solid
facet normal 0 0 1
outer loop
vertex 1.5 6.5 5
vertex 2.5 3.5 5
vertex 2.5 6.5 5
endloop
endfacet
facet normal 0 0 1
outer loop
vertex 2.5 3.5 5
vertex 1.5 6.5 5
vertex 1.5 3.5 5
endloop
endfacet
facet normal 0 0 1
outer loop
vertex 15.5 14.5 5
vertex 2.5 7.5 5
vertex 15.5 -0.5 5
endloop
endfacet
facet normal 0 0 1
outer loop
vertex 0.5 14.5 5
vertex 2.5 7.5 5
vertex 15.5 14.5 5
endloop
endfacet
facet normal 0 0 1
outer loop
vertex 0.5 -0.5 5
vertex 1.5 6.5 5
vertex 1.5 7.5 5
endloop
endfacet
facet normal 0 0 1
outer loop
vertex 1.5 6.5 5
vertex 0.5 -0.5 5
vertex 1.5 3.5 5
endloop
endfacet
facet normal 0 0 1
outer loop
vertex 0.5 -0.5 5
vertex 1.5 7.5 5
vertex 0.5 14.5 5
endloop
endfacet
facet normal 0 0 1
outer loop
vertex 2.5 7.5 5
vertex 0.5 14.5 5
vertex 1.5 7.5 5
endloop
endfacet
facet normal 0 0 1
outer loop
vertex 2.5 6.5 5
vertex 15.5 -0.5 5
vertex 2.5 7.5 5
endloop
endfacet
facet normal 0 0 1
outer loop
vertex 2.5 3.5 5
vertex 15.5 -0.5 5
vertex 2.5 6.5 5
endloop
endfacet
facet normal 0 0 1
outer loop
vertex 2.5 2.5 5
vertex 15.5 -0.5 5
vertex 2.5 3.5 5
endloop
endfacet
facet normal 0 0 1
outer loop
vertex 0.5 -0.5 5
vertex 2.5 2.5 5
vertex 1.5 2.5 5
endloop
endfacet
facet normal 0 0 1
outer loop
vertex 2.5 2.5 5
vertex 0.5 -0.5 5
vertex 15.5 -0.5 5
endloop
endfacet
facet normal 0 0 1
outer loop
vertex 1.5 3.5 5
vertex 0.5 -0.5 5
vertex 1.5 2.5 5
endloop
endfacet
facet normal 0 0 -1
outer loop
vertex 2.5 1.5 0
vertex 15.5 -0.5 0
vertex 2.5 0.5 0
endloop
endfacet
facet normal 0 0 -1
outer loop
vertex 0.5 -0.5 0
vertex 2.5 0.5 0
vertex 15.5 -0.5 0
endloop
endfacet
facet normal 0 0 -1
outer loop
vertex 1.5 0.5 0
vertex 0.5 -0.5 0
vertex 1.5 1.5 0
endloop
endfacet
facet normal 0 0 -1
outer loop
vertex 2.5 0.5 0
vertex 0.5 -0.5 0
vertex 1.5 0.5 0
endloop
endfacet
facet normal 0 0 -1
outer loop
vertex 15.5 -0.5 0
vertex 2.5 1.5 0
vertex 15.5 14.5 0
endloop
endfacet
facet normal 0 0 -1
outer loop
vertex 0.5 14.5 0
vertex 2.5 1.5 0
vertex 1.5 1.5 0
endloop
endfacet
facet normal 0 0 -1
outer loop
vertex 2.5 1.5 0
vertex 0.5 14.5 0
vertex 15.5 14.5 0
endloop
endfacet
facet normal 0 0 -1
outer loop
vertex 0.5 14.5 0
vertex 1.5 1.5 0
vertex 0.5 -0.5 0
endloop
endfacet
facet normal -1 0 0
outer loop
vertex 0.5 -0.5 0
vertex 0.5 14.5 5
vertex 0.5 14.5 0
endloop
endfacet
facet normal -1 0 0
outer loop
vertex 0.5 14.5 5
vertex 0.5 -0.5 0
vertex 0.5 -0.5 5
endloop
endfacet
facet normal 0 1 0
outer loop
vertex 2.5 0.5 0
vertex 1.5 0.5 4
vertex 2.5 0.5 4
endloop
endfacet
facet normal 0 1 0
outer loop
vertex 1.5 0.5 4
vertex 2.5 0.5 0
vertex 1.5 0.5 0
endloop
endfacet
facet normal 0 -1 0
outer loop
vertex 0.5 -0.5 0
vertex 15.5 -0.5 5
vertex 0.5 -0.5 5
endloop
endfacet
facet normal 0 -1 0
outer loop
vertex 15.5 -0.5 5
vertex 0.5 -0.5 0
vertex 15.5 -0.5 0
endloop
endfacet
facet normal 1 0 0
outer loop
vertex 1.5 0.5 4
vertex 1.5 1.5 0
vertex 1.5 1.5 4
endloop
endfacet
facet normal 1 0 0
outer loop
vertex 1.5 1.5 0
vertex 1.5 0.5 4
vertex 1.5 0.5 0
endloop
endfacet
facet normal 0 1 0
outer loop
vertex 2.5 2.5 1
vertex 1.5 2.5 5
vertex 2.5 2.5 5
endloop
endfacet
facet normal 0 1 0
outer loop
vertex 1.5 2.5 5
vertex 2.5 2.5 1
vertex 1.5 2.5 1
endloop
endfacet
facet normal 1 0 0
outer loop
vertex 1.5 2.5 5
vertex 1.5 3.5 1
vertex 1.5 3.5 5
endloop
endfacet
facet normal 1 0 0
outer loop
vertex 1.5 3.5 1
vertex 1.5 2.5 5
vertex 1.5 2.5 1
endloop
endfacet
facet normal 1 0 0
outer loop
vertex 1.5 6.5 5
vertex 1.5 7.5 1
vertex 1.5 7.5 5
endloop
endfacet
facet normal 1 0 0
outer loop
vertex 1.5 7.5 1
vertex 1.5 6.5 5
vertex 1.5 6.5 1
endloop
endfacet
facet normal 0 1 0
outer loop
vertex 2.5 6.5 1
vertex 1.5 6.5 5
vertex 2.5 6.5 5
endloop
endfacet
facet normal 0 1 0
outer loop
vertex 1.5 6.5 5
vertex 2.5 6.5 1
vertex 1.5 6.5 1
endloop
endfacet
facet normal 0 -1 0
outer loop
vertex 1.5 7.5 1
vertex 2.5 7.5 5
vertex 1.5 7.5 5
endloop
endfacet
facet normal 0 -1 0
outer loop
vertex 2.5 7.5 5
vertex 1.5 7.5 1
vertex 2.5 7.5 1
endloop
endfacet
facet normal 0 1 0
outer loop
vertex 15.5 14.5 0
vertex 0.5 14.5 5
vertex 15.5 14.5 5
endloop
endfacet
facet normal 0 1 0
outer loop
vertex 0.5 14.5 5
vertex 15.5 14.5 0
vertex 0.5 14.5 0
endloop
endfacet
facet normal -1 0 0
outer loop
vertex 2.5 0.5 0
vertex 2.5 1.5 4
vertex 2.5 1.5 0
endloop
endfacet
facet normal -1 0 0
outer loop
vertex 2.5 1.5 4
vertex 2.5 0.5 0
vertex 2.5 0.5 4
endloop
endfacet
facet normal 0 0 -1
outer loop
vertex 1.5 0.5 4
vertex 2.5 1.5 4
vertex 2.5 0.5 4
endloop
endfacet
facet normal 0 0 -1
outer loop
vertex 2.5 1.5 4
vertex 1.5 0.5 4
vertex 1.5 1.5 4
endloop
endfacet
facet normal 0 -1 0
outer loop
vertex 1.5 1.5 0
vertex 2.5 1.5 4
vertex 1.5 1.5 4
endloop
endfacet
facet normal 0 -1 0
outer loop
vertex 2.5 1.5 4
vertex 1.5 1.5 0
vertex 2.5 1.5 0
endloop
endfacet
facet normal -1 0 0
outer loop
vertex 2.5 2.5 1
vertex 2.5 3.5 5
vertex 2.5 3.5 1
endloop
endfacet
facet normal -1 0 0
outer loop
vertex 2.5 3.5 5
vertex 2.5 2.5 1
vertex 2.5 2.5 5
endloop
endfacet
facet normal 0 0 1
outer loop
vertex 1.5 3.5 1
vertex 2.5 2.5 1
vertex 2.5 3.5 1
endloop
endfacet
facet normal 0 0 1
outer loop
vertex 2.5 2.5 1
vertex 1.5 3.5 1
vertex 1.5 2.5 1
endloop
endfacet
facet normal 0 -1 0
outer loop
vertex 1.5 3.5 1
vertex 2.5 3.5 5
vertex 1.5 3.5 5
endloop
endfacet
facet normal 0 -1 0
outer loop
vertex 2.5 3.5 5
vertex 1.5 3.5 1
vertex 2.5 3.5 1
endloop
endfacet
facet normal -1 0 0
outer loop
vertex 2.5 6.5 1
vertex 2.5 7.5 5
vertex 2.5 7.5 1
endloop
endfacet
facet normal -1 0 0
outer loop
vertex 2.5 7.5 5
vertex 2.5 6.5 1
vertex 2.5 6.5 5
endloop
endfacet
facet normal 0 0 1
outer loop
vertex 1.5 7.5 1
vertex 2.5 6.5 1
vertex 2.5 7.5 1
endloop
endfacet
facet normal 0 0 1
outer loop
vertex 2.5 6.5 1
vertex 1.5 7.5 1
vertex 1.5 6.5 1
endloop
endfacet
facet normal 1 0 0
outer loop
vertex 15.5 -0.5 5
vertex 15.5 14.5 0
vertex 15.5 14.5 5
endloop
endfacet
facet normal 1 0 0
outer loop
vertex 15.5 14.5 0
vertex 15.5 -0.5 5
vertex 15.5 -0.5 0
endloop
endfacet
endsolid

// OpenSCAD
union() {
    translate([1, 0, 2.5]) cube([1, 1, 5], center=true);
    translate([1, 1, 2.5]) cube([1, 1, 5], center=true);
    translate([1, 2, 2.5]) cube([1, 1, 5], center=true);
    translate([1, 3, 2.5]) cube([1, 1, 5], center=true);
    translate([1, 4, 2.5]) cube([1, 1, 5], center=true);
    translate([1, 5, 2.5]) cube([1, 1, 5], center=true);
    translate([1, 6, 2.5]) cube([1, 1, 5], center=true);
    translate([1, 7, 2.5]) cube([1, 1, 5], center=true);
    translate([1, 8, 2.5]) cube([1, 1, 5], center=true);
    translate([1, 9, 2.5]) cube([1, 1, 5], center=true);
    translate([1, 10, 2.5]) cube([1, 1, 5], center=true);
    translate([1, 11, 2.5]) cube([1, 1, 5], center=true);
    translate([1, 12, 2.5]) cube([1, 1, 5], center=true);
    translate([1, 13, 2.5]) cube([1, 1, 5], center=true);
    translate([1, 14, 2.5]) cube([1, 1, 5], center=true);
    translate([2, 0, 2.5]) cube([1, 1, 5], center=true);
    translate([2, 1, 4.5]) color([1, 0, 0]) cube([1, 1, 1], center=true);
    translate([2, 2, 2.5]) cube([1, 1, 5], center=true);
    translate([2, 3, 0.5]) cube([1, 1, 1], center=true);
    translate([2, 4, 2.5]) cube([1, 1, 5], center=true);
    translate([2, 5, 2.5]) cube([1, 1, 5], center=true);
    translate([2, 6, 2.5]) cube([1, 1, 5], center=true);
    translate([2, 7, 0.5]) cube([1, 1, 1], center=true);
    translate([2, 8, 2.5]) cube([1, 1, 5], center=true);
    translate([2, 9, 2.5]) cube([1, 1, 5], center=true);
    translate([2, 10, 2.5]) cube([1, 1, 5], center=true);
    translate([2, 11, 2.5]) cube([1, 1, 5], center=true);
    translate([2, 12, 2.5]) cube([1, 1, 5], center=true);
    translate([2, 13, 2.5]) cube([1, 1, 5], center=true);
    translate([2, 14, 2.5]) cube([1, 1, 5], center=true);
    translate([3, 0, 2.5]) cube([1, 1, 5], center=true);
    translate([3, 1, 2.5]) cube([1, 1, 5], center=true);
    translate([3, 2, 2.5]) cube([1, 1, 5], center=true);
    translate([3, 3, 2.5]) cube([1, 1, 5], center=true);
    translate([3, 4, 2.5]) cube([1, 1, 5], center=true);
    translate([3, 5, 2.5]) cube([1, 1, 5], center=true);
    translate([3, 6, 2.5]) cube([1, 1, 5], center=true);
    translate([3, 7, 2.5]) cube([1, 1, 5], center=true);
    translate([3, 8, 2.5]) cube([1, 1, 5], center=true);
    translate([3, 9, 2.5]) cube([1, 1, 5], center=true);
    translate([3, 10, 2.5]) cube([1, 1, 5], center=true);
    translate([3, 11, 2.5]) cube([1, 1, 5], center=true);
    translate([3, 12, 2.5]) cube([1, 1, 5], center=true);
    translate([3, 13, 2.5]) cube([1, 1, 5], center=true);
    translate([3, 14, 2.5]) cube([1, 1, 5], center=true);
    translate([4, 0, 2.5]) cube([1, 1, 5], center=true);
    translate([4, 1, 2.5]) cube([1, 1, 5], center=true);
    translate([4, 2, 2.5]) cube([1, 1, 5], center=true);
    translate([4, 3, 2.5]) cube([1, 1, 5], center=true);
    translate([4, 4, 2.5]) cube([1, 1, 5], center=true);
    translate([4, 5, 2.5]) cube([1, 1, 5], center=true);
    translate([4, 6, 2.5]) cube([1, 1, 5], center=true);
    translate([4, 7, 2.5]) cube([1, 1, 5], center=true);
    translate([4, 8, 2.5]) cube([1, 1, 5], center=true);
    translate([4, 9, 2.5]) cube([1, 1, 5], center=true);
    translate([4, 10, 2.5]) cube([1, 1, 5], center=true);
    translate([4, 11, 2.5]) cube([1, 1, 5], center=true);
    translate([4, 12, 2.5]) cube([1, 1, 5], center=true);
    translate([4, 13, 2.5]) cube([1, 1, 5], center=true);
    translate([4, 14, 2.5]) cube([1, 1, 5], center=true);
    translate([5, 0, 2.5]) cube([1, 1, 5], center=true);
    translate([5, 1, 2.5]) cube([1, 1, 5], center=true);
    translate([5, 2, 2.5]) cube([1, 1, 5], center=true);
    translate([5, 3, 2.5]) cube([1, 1, 5], center=true);
    translate([5, 4, 2.5]) cube([1, 1, 5], center=true);
    translate([5, 5, 2.5]) cube([1, 1, 5], center=true);
    translate([5, 6, 2.5]) cube([1, 1, 5], center=true);
    translate([5, 7, 2.5]) cube([1, 1, 5], center=true);
    translate([5, 8, 2.5]) cube([1, 1, 5], center=true);
    translate([5, 9, 2.5]) cube([1, 1, 5], center=true);
    translate([5, 10, 2.5]) cube([1, 1, 5], center=true);
    translate([5, 11, 2.5]) cube([1, 1, 5], center=true);
    translate([5, 12, 2.5]) cube([1, 1, 5], center=true);
    translate([5, 13, 2.5]) cube([1, 1, 5], center=true);
    translate([5, 14, 2.5]) cube([1, 1, 5], center=true);
    translate([6, 0, 2.5]) cube([1, 1, 5], center=true);
    translate([6, 1, 2.5]) cube([1, 1, 5], center=true);
    translate([6, 2, 2.5]) cube([1, 1, 5], center=true);
    translate([6, 3, 2.5]) cube([1, 1, 5], center=true);
    translate([6, 4, 2.5]) cube([1, 1, 5], center=true);
    translate([6, 5, 2.5]) cube([1, 1, 5], center=true);
    translate([6, 6, 2.5]) cube([1, 1, 5], center=true);
    translate([6, 7, 2.5]) cube([1, 1, 5], center=true);
    translate([6, 8, 2.5]) cube([1, 1, 5], center=true);
    translate([6, 9, 2.5]) cube([1, 1, 5], center=true);
    translate([6, 10, 2.5]) cube([1, 1, 5], center=true);
    translate([6, 11, 2.5]) cube([1, 1, 5], center=true);
    translate([6, 12, 2.5]) cube([1, 1, 5], center=true);
    translate([6, 13, 2.5]) cube([1, 1, 5], center=true);
    translate([6, 14, 2.5]) cube([1, 1, 5], center=true);
    translate([7, 0, 2.5]) cube([1, 1, 5], center=true);
    translate([7, 1, 2.5]) cube([1, 1, 5], center=true);
    translate([7, 2, 2.5]) cube([1, 1, 5], center=true);
    translate([7, 3, 2.5]) cube([1, 1, 5], center=true);
    translate([7, 4, 2.5]) cube([1, 1, 5], center=true);
    translate([7, 5, 2.5]) cube([1, 1, 5], center=true);
    translate([7, 6, 2.5]) cube([1, 1, 5], center=true);
    translate([7, 7, 2.5]) cube([1, 1, 5], center=true);
    translate([7, 8, 2.5]) cube([1, 1, 5], center=true);
    translate([7, 9, 2.5]) cube([1, 1, 5], center=true);
    translate([7, 10, 2.5]) cube([1, 1, 5], center=true);
    translate([7, 11, 2.5]) cube([1, 1, 5], center=true);
    translate([7, 12, 2.5]) cube([1, 1, 5], center=true);
    translate([7, 13, 2.5]) cube([1, 1, 5], center=true);
    translate([7, 14, 2.5]) cube([1, 1, 5], center=true);
    translate([8, 0, 2.5]) cube([1, 1, 5], center=true);
    translate([8, 1, 2.5]) cube([1, 1, 5], center=true);
    translate([8, 2, 2.5]) cube([1, 1, 5], center=true);
    translate([8, 3, 2.5]) cube([1, 1, 5], center=true);
    translate([8, 4, 2.5]) cube([1, 1, 5], center=true);
    translate([8, 5, 2.5]) cube([1, 1, 5], center=true);
    translate([8, 6, 2.5]) cube([1, 1, 5], center=true);
    translate([8, 7, 2.5]) cube([1, 1, 5], center=true);
    translate([8, 8, 2.5]) cube([1, 1, 5], center=true);
    translate([8, 9, 2.5]) cube([1, 1, 5], center=true);
    translate([8, 10, 2.5]) cube([1, 1, 5], center=true);
    translate([8, 11, 2.5]) cube([1, 1, 5], center=true);
    translate([8, 12, 2.5]) cube([1, 1, 5], center=true);
    translate([8, 13, 2.5]) cube([1, 1, 5], center=true);
    translate([8, 14, 2.5]) cube([1, 1, 5], center=true);
    translate([9, 0, 2.5]) cube([1, 1, 5], center=true);
    translate([9, 1, 2.5]) cube([1, 1, 5], center=true);
    translate([9, 2, 2.5]) cube([1, 1, 5], center=true);
    translate([9, 3, 2.5]) cube([1, 1, 5], center=true);
    translate([9, 4, 2.5]) cube([1, 1, 5], center=true);
    translate([9, 5, 2.5]) cube([1, 1, 5], center=true);
    translate([9, 6, 2.5]) cube([1, 1, 5], center=true);
    translate([9, 7, 2.5]) cube([1, 1, 5], center=true);
    translate([9, 8, 2.5]) cube([1, 1, 5], center=true);
    translate([9, 9, 2.5]) cube([1, 1, 5], center=true);
    translate([9, 10, 2.5]) cube([1, 1, 5], center=true);
    translate([9, 11, 2.5]) cube([1, 1, 5], center=true);
    translate([9, 12, 2.5]) cube([1, 1, 5], center=true);
    translate([9, 13, 2.5]) cube([1, 1, 5], center=true);
    translate([9, 14, 2.5]) cube([1, 1, 5], center=true);
    translate([10, 0, 2.5]) cube([1, 1, 5], center=true);
    translate([10, 1, 2.5]) cube([1, 1, 5], center=true);
    translate([10, 2, 2.5]) cube([1, 1, 5], center=true);
    translate([10, 3, 2.5]) cube([1, 1, 5], center=true);
    translate([10, 4, 2.5]) cube([1, 1, 5], center=true);
    translate([10, 5, 2.5]) cube([1, 1, 5], center=true);
    translate([10, 6, 2.5]) cube([1, 1, 5], center=true);
    translate([10, 7, 2.5]) cube([1, 1, 5], center=true);
    translate([10, 8, 2.5]) cube([1, 1, 5], center=true);
    translate([10, 9, 2.5]) cube([1, 1, 5], center=true);
    translate([10, 10, 2.5]) cube([1, 1, 5], center=true);
    translate([10, 11, 2.5]) cube([1, 1, 5], center=true);
    translate([10, 12, 2.5]) cube([1, 1, 5], center=true);
    translate([10, 13, 2.5]) cube([1, 1, 5], center=true);
    translate([10, 14, 2.5]) cube([1, 1, 5], center=true);
    translate([11, 0, 2.5]) cube([1, 1, 5], center=true);
    translate([11, 1, 2.5]) cube([1, 1, 5], center=true);
    translate([11, 2, 2.5]) cube([1, 1, 5], center=true);
    translate([11, 3, 2.5]) cube([1, 1, 5], center=true);
    translate([11, 4, 2.5]) cube([1, 1, 5], center=true);
    translate([11, 5, 2.5]) cube([1, 1, 5], center=true);
    translate([11, 6, 2.5]) cube([1, 1, 5], center=true);
    translate([11, 7, 2.5]) cube([1, 1, 5], center=true);
    translate([11, 8, 2.5]) cube([1, 1, 5], center=true);
    translate([11, 9, 2.5]) cube([1, 1, 5], center=true);
    translate([11, 10, 2.5]) cube([1, 1, 5], center=true);
    translate([11, 11, 2.5]) cube([1, 1, 5], center=true);
    translate([11, 12, 2.5]) cube([1, 1, 5], center=true);
    translate([11, 13, 2.5]) cube([1, 1, 5], center=true);
    translate([11, 14, 2.5]) cube([1, 1, 5], center=true);
    translate([12, 0, 2.5]) cube([1, 1, 5], center=true);
    translate([12, 1, 2.5]) cube([1, 1, 5], center=true);
    translate([12, 2, 2.5]) cube([1, 1, 5], center=true);
    translate([12, 3, 2.5]) cube([1, 1, 5], center=true);
    translate([12, 4, 2.5]) cube([1, 1, 5], center=true);
    translate([12, 5, 2.5]) cube([1, 1, 5], center=true);
    translate([12, 6, 2.5]) cube([1, 1, 5], center=true);
    translate([12, 7, 2.5]) cube([1, 1, 5], center=true);
    translate([12, 8, 2.5]) cube([1, 1, 5], center=true);
    translate([12, 9, 2.5]) cube([1, 1, 5], center=true);
    translate([12, 10, 2.5]) cube([1, 1, 5], center=true);
    translate([12, 11, 2.5]) cube([1, 1, 5], center=true);
    translate([12, 12, 2.5]) cube([1, 1, 5], center=true);
    translate([12, 13, 2.5]) cube([1, 1, 5], center=true);
    translate([12, 14, 2.5]) cube([1, 1, 5], center=true);
    translate([13, 0, 2.5]) cube([1, 1, 5], center=true);
    translate([13, 1, 2.5]) cube([1, 1, 5], center=true);
    translate([13, 2, 2.5]) cube([1, 1, 5], center=true);
    translate([13, 3, 2.5]) cube([1, 1, 5], center=true);
    translate([13, 4, 2.5]) cube([1, 1, 5], center=true);
    translate([13, 5, 2.5]) cube([1, 1, 5], center=true);
    translate([13, 6, 2.5]) cube([1, 1, 5], center=true);
    translate([13, 7, 2.5]) cube([1, 1, 5], center=true);
    translate([13, 8, 2.5]) cube([1, 1, 5], center=true);
    translate([13, 9, 2.5]) cube([1, 1, 5], center=true);
    translate([13, 10, 2.5]) cube([1, 1, 5], center=true);
    translate([13, 11, 2.5]) cube([1, 1, 5], center=true);
    translate([13, 12, 2.5]) cube([1, 1, 5], center=true);
    translate([13, 13, 2.5]) cube([1, 1, 5], center=true);
    translate([13, 14, 2.5]) cube([1, 1, 5], center=true);
    translate([14, 0, 2.5]) cube([1, 1, 5], center=true);
    translate([14, 1, 2.5]) cube([1, 1, 5], center=true);
    translate([14, 2, 2.5]) cube([1, 1, 5], center=true);
    translate([14, 3, 2.5]) cube([1, 1, 5], center=true);
    translate([14, 4, 2.5]) cube([1, 1, 5], center=true);
    translate([14, 5, 2.5]) cube([1, 1, 5], center=true);
    translate([14, 6, 2.5]) cube([1, 1, 5], center=true);
    translate([14, 7, 2.5]) cube([1, 1, 5], center=true);
    translate([14, 8, 2.5]) cube([1, 1, 5], center=true);
    translate([14, 9, 2.5]) cube([1, 1, 5], center=true);
    translate([14, 10, 2.5]) cube([1, 1, 5], center=true);
    translate([14, 11, 2.5]) cube([1, 1, 5], center=true);
    translate([14, 12, 2.5]) cube([1, 1, 5], center=true);
    translate([14, 13, 2.5]) cube([1, 1, 5], center=true);
    translate([14, 14, 2.5]) cube([1, 1, 5], center=true);
    translate([15, 0, 2.5]) cube([1, 1, 5], center=true);
    translate([15, 1, 2.5]) cube([1, 1, 5], center=true);
    translate([15, 2, 2.5]) cube([1, 1, 5], center=true);
    translate([15, 3, 2.5]) cube([1, 1, 5], center=true);
    translate([15, 4, 2.5]) cube([1, 1, 5], center=true);
    translate([15, 5, 2.5]) cube([1, 1, 5], center=true);
    translate([15, 6, 2.5]) cube([1, 1, 5], center=true);
    translate([15, 7, 2.5]) cube([1, 1, 5], center=true);
    translate([15, 8, 2.5]) cube([1, 1, 5], center=true);
    translate([15, 9, 2.5]) cube([1, 1, 5], center=true);
    translate([15, 10, 2.5]) cube([1, 1, 5], center=true);
    translate([15, 11, 2.5]) cube([1, 1, 5], center=true);
    translate([15, 12, 2.5]) cube([1, 1, 5], center=true);
    translate([15, 13, 2.5]) cube([1, 1, 5], center=true);
    translate([15, 14, 2.5]) cube([1, 1, 5], center=true);
}
